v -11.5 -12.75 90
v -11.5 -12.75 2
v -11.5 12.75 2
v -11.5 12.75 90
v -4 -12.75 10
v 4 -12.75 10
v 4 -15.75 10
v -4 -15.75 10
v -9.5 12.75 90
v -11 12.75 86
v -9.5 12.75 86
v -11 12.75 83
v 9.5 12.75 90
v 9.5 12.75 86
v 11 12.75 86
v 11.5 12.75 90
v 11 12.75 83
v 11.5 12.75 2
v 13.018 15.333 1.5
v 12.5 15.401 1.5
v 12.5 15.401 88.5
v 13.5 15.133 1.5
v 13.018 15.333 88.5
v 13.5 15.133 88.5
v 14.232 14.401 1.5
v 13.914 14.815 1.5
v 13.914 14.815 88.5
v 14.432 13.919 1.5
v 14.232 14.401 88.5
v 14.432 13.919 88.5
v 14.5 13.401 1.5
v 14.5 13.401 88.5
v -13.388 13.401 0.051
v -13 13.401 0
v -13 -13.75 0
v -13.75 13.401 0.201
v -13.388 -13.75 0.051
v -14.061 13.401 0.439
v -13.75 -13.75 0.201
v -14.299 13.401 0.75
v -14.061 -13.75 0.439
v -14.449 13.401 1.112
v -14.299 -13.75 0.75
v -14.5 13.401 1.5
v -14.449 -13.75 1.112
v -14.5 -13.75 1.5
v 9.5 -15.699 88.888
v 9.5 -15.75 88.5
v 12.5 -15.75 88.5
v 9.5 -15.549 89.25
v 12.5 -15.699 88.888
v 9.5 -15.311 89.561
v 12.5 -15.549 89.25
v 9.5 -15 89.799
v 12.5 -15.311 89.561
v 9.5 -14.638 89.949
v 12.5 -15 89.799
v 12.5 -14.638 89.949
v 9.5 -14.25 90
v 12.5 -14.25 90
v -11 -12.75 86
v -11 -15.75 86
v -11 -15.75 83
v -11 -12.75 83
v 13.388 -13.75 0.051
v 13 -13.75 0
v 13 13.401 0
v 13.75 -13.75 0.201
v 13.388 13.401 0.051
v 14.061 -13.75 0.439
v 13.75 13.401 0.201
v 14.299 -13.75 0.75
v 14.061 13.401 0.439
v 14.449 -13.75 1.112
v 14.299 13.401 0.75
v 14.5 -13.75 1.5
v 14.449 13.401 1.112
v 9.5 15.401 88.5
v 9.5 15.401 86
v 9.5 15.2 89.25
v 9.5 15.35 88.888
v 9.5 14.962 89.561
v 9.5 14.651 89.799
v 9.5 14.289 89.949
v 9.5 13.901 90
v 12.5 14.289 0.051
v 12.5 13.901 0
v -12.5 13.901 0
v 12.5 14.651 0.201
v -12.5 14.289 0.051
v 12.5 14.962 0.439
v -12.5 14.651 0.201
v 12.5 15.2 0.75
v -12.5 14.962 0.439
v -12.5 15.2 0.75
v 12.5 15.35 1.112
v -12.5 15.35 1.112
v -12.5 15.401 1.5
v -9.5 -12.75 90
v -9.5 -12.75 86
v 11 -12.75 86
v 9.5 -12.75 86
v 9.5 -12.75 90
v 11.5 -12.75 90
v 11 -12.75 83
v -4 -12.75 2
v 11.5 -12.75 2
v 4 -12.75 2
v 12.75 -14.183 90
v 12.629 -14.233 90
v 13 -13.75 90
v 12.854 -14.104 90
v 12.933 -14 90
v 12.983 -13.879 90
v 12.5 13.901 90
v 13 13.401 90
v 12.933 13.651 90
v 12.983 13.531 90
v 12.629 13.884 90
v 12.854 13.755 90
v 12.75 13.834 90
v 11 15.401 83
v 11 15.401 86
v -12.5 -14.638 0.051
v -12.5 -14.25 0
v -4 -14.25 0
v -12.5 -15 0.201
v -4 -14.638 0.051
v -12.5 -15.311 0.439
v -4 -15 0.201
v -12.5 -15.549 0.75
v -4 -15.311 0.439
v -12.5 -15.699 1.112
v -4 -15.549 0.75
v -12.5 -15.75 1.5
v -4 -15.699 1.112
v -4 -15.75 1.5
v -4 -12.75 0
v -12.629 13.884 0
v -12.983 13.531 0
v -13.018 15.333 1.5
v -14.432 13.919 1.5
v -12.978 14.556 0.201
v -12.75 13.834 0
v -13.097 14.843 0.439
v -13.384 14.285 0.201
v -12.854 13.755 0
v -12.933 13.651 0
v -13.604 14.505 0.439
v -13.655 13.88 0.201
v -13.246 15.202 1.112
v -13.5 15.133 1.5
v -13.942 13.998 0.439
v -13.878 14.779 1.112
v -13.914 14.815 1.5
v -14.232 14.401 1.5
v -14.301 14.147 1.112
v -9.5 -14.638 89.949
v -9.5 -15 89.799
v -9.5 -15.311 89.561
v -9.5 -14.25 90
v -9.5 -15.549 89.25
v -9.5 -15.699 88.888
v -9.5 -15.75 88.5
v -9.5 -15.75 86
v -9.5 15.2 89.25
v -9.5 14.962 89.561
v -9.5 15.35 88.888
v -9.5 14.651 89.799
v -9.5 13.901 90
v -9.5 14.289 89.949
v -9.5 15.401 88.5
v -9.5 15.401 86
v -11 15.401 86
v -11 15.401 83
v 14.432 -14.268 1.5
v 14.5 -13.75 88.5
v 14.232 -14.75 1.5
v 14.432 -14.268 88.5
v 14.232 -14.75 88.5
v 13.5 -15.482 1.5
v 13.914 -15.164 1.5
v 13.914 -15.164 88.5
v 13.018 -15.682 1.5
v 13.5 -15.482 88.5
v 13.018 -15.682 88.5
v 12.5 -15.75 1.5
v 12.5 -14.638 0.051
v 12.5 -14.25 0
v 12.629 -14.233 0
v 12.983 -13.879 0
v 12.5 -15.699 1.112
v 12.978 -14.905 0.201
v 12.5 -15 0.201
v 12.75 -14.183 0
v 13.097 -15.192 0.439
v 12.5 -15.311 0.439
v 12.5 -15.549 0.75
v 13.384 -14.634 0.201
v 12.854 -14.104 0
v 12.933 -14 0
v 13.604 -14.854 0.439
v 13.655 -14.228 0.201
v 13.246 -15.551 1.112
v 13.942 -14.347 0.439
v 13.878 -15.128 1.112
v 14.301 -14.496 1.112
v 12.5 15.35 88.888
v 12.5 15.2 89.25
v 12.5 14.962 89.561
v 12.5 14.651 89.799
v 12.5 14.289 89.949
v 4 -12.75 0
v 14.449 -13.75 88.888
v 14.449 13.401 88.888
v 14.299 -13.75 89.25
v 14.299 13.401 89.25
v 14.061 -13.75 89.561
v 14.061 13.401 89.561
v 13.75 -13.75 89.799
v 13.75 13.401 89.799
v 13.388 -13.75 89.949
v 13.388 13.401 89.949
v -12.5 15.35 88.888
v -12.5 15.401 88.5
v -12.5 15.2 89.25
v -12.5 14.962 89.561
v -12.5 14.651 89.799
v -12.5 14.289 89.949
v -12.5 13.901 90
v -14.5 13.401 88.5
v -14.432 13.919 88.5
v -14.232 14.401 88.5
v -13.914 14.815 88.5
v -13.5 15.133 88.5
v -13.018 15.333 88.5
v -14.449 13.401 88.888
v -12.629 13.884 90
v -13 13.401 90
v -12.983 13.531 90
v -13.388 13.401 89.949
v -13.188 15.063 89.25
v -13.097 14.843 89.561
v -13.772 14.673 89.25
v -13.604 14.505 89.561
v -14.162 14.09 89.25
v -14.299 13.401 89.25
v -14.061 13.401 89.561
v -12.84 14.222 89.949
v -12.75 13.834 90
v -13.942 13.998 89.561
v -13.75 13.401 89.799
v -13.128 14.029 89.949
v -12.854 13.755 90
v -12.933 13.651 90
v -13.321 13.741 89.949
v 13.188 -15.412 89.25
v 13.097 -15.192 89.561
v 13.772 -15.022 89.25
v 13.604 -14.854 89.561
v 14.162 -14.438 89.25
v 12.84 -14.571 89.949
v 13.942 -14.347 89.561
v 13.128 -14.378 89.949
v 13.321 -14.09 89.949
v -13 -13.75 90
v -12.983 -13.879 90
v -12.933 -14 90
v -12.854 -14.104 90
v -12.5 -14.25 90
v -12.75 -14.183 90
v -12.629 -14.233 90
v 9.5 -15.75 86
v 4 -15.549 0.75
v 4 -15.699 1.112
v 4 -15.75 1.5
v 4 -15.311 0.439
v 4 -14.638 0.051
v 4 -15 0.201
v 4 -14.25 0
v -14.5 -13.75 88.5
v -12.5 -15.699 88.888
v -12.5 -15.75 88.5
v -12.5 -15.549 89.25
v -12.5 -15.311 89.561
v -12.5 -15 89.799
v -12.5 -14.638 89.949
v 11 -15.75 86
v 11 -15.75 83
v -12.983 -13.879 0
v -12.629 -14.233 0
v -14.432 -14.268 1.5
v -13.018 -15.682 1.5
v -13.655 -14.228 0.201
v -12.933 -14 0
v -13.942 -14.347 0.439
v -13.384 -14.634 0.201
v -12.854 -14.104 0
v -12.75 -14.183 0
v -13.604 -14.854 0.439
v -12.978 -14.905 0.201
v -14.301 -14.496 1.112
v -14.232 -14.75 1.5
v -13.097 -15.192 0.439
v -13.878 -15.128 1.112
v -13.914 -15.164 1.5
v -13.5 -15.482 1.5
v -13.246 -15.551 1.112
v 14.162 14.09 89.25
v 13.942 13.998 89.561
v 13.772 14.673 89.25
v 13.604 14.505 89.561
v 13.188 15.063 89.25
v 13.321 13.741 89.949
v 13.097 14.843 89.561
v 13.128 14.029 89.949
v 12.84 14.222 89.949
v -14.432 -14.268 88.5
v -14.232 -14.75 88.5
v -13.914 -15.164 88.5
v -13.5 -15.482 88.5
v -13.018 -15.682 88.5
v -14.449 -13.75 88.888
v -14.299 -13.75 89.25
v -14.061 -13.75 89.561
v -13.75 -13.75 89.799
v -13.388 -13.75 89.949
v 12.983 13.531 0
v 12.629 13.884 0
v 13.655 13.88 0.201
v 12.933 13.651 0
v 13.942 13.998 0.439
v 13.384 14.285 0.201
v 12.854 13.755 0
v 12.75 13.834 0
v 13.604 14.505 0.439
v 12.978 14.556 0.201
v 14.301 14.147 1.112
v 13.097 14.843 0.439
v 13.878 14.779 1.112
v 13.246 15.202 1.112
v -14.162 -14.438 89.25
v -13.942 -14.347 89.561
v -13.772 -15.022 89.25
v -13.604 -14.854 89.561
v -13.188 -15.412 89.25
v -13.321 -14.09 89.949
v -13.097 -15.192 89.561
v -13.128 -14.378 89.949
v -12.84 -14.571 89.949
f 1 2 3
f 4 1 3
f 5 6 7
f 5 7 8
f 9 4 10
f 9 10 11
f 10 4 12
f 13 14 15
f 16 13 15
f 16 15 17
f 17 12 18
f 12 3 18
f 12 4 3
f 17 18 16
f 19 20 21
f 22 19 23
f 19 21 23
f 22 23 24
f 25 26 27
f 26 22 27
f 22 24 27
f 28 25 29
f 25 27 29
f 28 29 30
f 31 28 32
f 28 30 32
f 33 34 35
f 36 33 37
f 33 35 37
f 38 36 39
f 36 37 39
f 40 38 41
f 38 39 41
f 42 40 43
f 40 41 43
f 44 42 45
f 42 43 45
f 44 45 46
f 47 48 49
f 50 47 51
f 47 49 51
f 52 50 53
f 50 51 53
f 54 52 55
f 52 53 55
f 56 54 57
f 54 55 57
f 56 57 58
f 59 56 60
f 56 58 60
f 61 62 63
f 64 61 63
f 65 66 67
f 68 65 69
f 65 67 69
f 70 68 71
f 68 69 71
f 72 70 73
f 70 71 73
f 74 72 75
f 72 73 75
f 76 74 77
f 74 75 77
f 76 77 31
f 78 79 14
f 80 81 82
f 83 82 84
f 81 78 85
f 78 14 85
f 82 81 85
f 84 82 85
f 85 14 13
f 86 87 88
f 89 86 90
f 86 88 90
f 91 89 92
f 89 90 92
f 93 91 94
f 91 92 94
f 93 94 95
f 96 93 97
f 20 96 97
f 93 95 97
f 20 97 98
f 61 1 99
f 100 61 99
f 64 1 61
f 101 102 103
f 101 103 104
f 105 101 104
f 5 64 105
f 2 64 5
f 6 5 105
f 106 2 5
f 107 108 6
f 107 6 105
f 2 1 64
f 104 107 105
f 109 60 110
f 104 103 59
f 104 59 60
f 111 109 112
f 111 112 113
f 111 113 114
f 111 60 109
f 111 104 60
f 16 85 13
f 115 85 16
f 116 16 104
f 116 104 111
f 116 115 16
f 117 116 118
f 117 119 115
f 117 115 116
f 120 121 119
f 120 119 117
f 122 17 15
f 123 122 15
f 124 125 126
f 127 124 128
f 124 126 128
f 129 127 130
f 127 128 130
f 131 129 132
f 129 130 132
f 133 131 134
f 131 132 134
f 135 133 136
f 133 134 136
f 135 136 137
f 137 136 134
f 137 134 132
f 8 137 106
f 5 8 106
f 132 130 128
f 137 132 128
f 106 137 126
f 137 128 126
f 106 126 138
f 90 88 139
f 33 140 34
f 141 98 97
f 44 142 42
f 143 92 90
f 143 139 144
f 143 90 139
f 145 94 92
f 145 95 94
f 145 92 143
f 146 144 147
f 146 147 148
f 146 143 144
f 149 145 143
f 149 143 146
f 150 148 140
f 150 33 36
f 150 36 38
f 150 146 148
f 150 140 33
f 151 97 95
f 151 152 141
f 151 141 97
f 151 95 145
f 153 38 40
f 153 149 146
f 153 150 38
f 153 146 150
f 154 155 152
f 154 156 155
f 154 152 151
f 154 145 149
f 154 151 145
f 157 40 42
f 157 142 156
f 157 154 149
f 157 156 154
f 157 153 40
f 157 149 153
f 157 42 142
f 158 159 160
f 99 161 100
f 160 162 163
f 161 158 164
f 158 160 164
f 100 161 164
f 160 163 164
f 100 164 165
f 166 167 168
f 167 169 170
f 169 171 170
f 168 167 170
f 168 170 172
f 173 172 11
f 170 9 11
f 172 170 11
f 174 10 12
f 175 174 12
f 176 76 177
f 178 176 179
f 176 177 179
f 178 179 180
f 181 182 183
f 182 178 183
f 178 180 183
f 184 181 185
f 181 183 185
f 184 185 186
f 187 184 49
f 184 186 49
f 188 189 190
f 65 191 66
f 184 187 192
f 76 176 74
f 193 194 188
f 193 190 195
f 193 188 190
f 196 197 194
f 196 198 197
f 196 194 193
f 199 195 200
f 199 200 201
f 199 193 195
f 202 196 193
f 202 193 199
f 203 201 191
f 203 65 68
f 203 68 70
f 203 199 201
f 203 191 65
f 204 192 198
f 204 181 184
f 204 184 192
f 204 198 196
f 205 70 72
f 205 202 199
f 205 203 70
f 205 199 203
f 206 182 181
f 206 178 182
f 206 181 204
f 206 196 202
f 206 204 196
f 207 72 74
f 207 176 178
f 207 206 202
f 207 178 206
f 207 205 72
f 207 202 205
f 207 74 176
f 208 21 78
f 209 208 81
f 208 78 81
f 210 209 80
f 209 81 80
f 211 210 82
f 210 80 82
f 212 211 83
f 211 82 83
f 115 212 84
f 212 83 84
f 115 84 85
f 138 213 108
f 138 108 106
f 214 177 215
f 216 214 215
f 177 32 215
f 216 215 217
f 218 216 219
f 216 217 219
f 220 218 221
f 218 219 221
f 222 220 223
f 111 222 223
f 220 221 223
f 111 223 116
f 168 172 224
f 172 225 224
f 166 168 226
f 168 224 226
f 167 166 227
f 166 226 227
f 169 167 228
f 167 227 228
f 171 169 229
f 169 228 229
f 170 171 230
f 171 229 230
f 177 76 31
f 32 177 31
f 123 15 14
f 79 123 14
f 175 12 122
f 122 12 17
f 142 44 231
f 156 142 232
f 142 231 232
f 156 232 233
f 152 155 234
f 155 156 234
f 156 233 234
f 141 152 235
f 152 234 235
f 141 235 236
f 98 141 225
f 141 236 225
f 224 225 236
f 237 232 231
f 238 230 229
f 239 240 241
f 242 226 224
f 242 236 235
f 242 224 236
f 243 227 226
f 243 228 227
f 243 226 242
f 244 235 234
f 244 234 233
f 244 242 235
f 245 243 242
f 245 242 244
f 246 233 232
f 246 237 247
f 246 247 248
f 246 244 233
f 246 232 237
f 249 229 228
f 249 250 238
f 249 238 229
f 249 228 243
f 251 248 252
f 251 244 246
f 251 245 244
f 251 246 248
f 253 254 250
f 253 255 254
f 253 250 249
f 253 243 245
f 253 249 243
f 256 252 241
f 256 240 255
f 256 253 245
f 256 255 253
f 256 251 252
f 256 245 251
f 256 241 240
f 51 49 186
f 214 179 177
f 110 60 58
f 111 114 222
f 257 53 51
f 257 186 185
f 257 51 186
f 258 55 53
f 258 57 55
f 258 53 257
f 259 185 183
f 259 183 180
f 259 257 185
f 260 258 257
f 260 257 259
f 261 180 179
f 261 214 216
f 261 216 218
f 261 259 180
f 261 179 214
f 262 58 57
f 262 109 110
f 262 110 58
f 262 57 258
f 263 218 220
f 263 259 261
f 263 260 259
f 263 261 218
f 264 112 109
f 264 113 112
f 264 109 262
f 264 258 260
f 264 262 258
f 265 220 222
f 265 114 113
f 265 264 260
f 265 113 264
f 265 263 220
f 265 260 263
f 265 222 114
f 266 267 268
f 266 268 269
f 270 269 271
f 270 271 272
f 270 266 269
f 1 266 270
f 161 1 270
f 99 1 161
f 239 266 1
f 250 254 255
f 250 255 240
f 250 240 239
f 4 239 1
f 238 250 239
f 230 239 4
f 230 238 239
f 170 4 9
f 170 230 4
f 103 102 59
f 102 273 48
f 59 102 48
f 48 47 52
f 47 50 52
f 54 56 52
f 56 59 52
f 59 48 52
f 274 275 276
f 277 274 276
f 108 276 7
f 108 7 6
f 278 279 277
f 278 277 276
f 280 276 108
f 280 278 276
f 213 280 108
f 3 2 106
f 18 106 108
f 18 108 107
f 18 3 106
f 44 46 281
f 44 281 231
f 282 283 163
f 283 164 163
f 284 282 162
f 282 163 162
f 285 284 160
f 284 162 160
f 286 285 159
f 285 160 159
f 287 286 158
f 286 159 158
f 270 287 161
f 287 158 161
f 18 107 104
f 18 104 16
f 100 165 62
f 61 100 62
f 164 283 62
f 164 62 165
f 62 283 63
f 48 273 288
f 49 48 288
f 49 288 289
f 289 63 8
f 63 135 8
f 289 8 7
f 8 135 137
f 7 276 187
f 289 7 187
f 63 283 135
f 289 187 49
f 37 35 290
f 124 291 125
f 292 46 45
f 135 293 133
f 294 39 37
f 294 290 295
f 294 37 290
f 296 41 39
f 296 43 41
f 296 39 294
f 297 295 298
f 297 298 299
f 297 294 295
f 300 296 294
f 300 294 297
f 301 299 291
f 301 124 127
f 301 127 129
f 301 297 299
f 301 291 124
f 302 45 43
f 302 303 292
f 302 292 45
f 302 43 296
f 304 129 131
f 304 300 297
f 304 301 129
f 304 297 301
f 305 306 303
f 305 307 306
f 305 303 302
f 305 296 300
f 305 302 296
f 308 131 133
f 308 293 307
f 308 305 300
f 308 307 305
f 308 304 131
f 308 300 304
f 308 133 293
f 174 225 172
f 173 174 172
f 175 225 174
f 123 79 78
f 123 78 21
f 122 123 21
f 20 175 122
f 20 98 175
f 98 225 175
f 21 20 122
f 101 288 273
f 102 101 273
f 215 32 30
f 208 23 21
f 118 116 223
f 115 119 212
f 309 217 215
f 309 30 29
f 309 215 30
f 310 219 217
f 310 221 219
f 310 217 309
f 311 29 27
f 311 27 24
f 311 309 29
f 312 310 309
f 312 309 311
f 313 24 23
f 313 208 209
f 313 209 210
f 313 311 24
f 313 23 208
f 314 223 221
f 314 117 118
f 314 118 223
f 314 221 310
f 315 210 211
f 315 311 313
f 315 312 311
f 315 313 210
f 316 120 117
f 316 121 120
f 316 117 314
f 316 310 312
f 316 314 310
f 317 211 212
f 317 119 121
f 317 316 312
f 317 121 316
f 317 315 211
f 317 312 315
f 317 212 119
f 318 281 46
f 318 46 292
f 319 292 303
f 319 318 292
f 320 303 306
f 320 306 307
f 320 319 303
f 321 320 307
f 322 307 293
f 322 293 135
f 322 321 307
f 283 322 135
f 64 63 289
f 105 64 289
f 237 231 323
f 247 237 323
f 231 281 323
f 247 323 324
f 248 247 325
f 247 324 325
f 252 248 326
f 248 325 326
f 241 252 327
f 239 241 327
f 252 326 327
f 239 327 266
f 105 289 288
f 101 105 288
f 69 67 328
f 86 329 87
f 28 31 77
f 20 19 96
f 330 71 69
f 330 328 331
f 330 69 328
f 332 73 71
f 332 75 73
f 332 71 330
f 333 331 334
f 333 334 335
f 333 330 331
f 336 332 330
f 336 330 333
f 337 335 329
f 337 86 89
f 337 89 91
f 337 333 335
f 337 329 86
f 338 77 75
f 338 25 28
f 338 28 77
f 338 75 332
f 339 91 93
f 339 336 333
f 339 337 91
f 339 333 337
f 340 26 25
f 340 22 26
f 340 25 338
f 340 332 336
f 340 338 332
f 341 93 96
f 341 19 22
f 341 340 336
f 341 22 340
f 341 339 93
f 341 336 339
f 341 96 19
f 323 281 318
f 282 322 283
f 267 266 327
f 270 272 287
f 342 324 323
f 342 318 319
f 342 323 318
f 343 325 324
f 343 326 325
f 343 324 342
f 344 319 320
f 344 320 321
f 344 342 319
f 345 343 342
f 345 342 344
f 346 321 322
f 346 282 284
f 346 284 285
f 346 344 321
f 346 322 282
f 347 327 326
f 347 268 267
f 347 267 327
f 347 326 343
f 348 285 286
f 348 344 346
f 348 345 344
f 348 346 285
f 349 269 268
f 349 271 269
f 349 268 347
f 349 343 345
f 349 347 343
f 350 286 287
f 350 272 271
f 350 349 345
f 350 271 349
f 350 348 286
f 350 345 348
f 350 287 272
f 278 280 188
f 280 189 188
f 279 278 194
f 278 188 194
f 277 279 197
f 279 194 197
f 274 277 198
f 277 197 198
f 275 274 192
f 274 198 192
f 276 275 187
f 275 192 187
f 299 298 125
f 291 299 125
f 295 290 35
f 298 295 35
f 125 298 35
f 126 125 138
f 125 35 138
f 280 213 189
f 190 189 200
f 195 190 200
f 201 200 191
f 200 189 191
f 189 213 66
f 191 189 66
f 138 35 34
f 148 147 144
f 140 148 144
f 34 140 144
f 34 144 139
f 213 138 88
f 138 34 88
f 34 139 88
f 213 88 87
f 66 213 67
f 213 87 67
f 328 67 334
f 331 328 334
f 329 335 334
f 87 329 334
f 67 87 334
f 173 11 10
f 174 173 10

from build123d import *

# Parameters (mm, degrees)
SKETCH_1_W               = 29
SKETCH_1_H               = 31.151212228
SKETCH_1_W_2             = 23
SKETCH_1_H_2             = 25.5
EXTRUDE_1_DEPTH          = 90
SKETCH_1_2_W             = 23
SKETCH_1_2_H             = 25.5
EXTRUDE_2_DEPTH          = 2
SKETCH_2_W               = 8
SKETCH_2_H               = 3
CUT_EXTRUDE_1_DEPTH      = 10
CUT_EXTRUDE_2_DEPTH      = 93.511147977
CUT_EXTRUDE_2_DEPTH_BACK = 93.511147977
FILLET_1_R               = 2
FILLET_2_R               = 1.5


with BuildPart() as part:
    # 스케치1 → 보스-돌출1 (new body)
    with BuildSketch(Plane.XY):
        with Locations((0, -0.174393886)):
            Rectangle(SKETCH_1_W, SKETCH_1_H)
        Rectangle(SKETCH_1_W_2, SKETCH_1_H_2, mode=Mode.SUBTRACT)
    extrude(amount=EXTRUDE_1_DEPTH)

    # 스케치1<2> → 보스-돌출2 (add)
    with BuildSketch(Plane.XY):
        Rectangle(SKETCH_1_2_W, SKETCH_1_2_H)
    extrude(amount=EXTRUDE_2_DEPTH)

    # 스케치2 → 컷-돌출1 (cut)
    with BuildSketch(Plane(origin=(0, 0, 0), x_dir=(-1, 0, 0), z_dir=(0, 0, -1))):
        with Locations((0, -14.25)):
            Rectangle(SKETCH_2_W, SKETCH_2_H)
    extrude(amount=-CUT_EXTRUDE_1_DEPTH, mode=Mode.SUBTRACT)

    # 스케치3 → 컷-돌출2 (cut, two sides: drawn at the far end of the back side and taken through both)
    with BuildSketch(Plane(origin=(0, 0, 0), x_dir=(1, 0, 0), z_dir=(0, 1, 0)).offset(-CUT_EXTRUDE_2_DEPTH_BACK)):
        Polygon((-9.5, -90), (-9.5, -86), (-11, -86), (-11, -83), (11, -83), (11, -86), (9.5, -86), (9.5, -90), align=None)
    extrude(amount=CUT_EXTRUDE_2_DEPTH + CUT_EXTRUDE_2_DEPTH_BACK, mode=Mode.SUBTRACT)

    # 필렛1
    fillet_1_edges = [part.edges().sort_by_distance(p)[0] for p in [
        (14.5, 15.401212228, 45),
        (14.5, -15.75, 45),
        (-14.5, -15.75, 45),
        (-14.5, 15.401212228, 45),
    ]]
    fillet(fillet_1_edges, radius=FILLET_1_R)

    # 필렛2
    fillet_2_edges = [part.edges().sort_by_distance(p)[0] for p in [
        (-11, -15.75, 90),
        (-8.25, -15.75, 0),
        (-14.5, -0.174393886, 0),
        (0, 15.401212228, 0),
        (14.5, -0.174393886, 0),
        (-13.914213562, 14.81542579, 0),
        (13.914213562, 14.81542579, 0),
        (13.914213562, -15.164213562, 0),
        (-13.914213562, -15.164213562, 0),
        (-14.5, -0.174393886, 90),
        (-13.914213562, 14.81542579, 90),
        (-13.914213562, -15.164213562, 90),
        (14.5, -0.174393886, 90),
        (11, 15.401212228, 90),
        (13.914213562, 14.81542579, 90),
        (13.914213562, -15.164213562, 90),
        (8.25, -15.75, 0),
        (11, -15.75, 90),
        (-11, 15.401212228, 90),
    ]]
    fillet(fillet_2_edges, radius=FILLET_2_R)


solid = part.part
